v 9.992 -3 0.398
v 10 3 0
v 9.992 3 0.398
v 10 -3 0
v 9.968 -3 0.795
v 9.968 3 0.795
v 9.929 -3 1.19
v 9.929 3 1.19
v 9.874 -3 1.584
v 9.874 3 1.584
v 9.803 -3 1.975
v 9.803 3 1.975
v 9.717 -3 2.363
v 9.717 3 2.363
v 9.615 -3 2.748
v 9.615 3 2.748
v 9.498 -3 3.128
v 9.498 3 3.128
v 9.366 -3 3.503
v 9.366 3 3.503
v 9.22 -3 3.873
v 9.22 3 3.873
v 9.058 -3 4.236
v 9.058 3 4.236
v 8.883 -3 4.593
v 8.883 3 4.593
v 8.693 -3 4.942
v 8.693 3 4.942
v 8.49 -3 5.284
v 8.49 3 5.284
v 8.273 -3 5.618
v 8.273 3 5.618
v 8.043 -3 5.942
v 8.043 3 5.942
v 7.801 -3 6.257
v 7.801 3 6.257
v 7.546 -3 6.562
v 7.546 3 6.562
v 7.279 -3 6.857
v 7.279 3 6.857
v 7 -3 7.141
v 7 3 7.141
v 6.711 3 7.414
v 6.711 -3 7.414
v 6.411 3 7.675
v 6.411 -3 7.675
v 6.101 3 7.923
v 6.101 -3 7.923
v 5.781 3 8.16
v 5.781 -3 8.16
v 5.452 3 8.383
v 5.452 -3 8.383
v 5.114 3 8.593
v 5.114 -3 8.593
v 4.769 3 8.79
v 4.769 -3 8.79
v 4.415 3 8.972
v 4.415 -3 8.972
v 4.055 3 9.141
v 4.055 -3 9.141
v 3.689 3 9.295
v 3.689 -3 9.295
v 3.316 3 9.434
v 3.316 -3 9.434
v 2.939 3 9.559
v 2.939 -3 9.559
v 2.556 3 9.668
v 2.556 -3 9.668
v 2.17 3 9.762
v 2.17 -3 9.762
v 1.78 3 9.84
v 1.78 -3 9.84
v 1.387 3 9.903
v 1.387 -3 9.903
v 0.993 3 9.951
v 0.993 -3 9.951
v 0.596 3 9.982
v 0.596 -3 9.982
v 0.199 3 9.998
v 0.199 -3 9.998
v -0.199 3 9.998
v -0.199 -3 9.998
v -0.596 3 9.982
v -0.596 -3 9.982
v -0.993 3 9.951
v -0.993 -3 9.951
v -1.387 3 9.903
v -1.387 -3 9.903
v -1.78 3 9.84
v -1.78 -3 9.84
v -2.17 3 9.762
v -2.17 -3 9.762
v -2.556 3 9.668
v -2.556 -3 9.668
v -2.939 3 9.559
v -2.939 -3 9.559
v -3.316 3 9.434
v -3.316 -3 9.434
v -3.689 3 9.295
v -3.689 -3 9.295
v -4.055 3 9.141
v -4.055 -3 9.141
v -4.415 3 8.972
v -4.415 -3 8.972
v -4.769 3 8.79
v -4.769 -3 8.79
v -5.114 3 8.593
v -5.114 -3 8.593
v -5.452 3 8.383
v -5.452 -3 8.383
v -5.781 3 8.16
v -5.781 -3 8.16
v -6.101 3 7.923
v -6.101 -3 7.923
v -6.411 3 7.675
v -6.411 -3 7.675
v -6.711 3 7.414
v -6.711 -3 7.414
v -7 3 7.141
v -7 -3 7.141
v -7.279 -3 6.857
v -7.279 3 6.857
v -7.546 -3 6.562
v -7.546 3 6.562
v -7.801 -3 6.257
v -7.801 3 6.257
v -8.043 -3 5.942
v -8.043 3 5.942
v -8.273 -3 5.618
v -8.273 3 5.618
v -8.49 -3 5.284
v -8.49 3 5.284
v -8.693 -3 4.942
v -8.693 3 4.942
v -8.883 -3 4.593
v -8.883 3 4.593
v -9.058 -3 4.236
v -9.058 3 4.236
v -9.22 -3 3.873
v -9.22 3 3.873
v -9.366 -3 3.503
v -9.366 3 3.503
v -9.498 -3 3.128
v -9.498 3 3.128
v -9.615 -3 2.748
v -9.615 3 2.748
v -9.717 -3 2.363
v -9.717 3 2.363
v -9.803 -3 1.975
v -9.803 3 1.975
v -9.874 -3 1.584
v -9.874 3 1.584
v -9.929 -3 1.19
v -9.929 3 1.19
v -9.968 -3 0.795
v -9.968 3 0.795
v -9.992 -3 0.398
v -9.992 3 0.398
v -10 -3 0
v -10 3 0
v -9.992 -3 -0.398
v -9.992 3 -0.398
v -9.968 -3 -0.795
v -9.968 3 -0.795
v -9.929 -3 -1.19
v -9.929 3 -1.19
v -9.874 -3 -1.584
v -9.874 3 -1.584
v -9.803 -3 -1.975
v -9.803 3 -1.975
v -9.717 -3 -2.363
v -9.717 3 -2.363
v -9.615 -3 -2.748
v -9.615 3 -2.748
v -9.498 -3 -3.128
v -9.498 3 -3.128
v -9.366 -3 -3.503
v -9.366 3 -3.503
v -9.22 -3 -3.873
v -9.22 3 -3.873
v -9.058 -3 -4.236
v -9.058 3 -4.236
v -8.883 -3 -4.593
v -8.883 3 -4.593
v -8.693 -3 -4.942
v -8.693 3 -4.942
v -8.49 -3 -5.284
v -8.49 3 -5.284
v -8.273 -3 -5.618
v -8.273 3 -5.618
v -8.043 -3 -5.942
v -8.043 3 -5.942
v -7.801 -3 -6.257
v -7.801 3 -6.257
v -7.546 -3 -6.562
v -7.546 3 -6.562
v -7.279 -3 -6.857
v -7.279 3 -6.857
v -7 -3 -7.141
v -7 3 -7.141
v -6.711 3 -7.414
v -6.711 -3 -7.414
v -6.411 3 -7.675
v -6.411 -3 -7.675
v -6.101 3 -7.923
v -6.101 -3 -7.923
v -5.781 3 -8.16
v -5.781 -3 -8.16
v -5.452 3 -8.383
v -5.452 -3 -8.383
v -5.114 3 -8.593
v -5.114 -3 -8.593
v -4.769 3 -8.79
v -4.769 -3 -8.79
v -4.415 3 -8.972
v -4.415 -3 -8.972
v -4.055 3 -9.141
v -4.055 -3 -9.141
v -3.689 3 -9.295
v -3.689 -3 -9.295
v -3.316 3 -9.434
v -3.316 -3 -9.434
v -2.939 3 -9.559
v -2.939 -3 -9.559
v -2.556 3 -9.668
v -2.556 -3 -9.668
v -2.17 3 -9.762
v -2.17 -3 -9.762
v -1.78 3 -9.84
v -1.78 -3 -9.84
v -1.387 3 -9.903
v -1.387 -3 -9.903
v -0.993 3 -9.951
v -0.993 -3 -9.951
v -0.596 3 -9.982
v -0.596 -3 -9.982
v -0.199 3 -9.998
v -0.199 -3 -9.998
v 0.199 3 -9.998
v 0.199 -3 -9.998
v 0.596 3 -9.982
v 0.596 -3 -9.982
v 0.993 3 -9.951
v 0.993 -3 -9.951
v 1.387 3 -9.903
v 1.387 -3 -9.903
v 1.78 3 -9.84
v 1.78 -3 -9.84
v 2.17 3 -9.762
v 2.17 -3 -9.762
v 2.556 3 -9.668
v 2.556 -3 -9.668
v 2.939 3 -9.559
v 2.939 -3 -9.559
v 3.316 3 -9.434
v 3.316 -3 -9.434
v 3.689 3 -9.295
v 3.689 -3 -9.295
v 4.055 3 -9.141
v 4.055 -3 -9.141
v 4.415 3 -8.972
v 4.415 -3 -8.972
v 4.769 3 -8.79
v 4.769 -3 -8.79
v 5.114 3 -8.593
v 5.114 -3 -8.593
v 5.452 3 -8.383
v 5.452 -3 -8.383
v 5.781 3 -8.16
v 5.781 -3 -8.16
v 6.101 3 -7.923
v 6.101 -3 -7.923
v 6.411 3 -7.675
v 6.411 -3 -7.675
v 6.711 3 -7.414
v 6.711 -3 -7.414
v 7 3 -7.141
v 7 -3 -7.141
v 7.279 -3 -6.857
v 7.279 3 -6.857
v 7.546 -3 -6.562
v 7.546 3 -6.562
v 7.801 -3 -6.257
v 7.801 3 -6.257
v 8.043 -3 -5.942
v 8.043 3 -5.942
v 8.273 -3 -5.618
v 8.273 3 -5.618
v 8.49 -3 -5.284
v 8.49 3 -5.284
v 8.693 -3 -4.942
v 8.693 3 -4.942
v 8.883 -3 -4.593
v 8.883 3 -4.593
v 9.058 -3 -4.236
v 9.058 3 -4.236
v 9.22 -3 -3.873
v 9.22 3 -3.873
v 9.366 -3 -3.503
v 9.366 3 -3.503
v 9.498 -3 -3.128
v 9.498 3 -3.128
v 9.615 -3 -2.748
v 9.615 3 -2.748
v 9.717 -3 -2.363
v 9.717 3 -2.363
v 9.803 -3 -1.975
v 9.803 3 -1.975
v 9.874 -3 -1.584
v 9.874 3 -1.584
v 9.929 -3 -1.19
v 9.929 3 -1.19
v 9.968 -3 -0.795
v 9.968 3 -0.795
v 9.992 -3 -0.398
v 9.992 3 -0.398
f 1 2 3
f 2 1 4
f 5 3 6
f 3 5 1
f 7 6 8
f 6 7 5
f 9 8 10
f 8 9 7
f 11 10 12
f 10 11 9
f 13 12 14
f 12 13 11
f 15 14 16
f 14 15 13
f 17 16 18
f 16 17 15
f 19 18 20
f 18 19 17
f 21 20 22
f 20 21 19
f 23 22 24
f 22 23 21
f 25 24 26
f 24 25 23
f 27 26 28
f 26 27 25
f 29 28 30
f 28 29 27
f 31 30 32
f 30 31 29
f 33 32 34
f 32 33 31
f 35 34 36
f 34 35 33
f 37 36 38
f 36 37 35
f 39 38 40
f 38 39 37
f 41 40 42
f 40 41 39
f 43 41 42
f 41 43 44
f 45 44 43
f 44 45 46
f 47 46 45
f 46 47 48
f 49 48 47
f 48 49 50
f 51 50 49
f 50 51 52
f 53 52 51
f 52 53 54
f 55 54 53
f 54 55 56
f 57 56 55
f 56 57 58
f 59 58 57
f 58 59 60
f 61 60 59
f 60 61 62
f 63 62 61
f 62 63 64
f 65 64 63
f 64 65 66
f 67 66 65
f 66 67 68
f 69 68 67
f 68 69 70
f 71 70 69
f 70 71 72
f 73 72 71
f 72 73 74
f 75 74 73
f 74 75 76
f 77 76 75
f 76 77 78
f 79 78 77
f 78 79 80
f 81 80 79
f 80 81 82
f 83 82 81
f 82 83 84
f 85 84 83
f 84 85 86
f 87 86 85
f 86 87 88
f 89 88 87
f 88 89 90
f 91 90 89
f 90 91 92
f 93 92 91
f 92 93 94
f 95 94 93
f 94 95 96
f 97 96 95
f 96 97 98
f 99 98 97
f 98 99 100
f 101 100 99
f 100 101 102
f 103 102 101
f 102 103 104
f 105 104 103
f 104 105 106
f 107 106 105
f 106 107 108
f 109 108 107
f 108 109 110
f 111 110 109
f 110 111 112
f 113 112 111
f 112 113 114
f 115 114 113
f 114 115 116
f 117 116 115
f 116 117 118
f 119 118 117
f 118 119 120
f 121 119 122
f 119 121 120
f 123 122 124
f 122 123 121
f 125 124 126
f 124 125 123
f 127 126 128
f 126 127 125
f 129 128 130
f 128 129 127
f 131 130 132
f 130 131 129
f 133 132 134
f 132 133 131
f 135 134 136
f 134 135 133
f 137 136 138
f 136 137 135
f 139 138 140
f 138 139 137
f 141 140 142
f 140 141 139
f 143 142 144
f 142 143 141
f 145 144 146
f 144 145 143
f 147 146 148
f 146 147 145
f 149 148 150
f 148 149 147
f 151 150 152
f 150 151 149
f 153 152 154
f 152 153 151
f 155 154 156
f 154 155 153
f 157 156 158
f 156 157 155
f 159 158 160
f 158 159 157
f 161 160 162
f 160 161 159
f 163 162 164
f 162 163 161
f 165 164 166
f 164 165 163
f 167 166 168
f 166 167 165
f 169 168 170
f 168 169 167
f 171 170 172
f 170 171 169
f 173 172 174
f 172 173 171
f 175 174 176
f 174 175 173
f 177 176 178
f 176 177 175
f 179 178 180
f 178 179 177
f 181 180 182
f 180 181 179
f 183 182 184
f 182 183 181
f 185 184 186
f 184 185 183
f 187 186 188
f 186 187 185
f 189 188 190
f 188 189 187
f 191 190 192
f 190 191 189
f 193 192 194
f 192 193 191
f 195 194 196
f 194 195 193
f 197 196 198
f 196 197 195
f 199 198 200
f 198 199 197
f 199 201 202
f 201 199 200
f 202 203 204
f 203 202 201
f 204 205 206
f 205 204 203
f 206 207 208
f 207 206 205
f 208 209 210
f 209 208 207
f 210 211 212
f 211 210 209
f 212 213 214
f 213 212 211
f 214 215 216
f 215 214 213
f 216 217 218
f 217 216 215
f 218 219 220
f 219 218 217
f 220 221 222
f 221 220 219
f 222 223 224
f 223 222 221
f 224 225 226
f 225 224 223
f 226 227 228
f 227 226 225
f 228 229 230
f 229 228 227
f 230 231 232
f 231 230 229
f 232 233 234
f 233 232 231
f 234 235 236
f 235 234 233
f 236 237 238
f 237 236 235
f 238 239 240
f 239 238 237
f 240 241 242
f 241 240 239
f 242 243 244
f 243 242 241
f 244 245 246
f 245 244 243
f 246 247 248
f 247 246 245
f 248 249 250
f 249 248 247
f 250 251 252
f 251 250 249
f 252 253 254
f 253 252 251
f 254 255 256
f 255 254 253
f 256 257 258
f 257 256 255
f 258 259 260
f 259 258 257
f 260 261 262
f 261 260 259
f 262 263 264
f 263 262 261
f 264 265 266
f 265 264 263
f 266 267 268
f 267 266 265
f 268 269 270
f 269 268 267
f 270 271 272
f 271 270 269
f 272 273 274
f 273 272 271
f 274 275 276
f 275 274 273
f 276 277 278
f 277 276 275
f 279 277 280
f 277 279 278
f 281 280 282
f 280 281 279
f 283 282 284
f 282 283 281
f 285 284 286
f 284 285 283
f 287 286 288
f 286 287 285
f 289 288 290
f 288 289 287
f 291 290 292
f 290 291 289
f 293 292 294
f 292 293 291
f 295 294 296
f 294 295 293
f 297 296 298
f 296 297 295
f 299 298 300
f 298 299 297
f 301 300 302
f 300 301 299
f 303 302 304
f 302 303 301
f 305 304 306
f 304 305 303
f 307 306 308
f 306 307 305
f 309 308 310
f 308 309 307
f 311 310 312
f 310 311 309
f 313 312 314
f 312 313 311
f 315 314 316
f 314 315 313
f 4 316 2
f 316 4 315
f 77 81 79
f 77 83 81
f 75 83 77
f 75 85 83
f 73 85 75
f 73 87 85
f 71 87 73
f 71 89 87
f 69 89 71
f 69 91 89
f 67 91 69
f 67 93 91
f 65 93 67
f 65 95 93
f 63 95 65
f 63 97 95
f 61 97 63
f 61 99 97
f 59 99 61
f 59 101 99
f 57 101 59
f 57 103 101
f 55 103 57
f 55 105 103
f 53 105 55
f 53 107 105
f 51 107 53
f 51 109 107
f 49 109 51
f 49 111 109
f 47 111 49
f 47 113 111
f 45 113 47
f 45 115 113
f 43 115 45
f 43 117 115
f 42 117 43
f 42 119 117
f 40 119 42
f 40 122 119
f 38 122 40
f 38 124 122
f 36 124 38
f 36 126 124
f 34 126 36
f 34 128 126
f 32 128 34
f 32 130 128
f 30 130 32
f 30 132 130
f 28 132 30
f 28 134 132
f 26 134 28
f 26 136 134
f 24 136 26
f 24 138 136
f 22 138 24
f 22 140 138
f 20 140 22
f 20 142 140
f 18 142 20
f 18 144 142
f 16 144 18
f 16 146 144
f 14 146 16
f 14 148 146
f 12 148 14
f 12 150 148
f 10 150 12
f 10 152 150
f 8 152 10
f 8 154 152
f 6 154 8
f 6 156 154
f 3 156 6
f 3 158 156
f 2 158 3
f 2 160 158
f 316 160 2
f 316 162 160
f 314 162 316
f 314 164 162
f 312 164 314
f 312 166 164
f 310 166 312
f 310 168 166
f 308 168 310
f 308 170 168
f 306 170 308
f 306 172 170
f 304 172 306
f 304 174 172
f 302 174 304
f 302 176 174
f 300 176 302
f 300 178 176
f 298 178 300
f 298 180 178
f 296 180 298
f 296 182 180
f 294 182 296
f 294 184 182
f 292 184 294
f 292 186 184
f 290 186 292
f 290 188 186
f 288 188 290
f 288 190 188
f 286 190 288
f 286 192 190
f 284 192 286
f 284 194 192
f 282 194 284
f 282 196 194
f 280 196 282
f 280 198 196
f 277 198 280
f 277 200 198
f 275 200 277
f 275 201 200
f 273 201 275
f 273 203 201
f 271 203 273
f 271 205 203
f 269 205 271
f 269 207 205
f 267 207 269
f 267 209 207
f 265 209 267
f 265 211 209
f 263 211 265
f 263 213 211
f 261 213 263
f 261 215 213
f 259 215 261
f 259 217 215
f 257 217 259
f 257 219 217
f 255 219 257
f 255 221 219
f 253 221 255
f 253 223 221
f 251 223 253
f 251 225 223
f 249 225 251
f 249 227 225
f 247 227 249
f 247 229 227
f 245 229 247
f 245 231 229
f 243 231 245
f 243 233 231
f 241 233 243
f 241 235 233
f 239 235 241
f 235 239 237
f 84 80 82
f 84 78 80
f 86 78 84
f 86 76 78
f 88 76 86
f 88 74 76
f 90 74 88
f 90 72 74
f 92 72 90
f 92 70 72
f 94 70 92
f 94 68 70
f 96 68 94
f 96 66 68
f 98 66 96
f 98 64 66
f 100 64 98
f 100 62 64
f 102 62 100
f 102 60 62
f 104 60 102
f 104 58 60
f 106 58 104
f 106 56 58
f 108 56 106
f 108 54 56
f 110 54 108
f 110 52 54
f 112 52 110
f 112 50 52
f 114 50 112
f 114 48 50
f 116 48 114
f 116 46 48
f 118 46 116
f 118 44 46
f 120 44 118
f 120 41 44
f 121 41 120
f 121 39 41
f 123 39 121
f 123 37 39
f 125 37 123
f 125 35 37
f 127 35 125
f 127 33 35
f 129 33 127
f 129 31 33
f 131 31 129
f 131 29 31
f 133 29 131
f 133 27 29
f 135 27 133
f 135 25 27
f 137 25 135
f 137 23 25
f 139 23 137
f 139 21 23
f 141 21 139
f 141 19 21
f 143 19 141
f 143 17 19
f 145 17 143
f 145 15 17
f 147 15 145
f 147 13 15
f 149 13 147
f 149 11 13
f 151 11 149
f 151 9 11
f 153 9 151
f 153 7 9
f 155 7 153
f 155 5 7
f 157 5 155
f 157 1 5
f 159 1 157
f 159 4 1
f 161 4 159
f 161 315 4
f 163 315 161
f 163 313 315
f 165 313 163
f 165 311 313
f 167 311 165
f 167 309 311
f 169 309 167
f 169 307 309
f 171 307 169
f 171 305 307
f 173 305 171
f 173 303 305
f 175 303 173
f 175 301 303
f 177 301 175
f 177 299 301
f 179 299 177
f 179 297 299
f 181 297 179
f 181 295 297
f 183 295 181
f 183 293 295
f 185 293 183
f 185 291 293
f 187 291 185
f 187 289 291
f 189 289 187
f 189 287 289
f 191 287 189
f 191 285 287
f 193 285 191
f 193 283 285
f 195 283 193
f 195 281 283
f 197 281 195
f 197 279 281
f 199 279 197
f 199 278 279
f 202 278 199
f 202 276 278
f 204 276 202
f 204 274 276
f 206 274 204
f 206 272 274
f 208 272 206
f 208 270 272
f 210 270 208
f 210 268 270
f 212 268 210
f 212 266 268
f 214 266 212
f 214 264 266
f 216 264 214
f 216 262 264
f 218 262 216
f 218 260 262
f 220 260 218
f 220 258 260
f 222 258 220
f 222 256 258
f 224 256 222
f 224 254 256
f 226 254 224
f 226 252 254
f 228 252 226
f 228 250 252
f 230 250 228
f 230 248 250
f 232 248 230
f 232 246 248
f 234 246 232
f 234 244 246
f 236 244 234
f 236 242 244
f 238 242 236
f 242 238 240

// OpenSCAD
$fa=1;
$fs=0.4;
module simple_wheel(wheel_radius=10, wheel_width=6) {
    rotate([90,0,0])
        cylinder(h=wheel_width,r=wheel_radius,center=true);
    }
simple_wheel();
